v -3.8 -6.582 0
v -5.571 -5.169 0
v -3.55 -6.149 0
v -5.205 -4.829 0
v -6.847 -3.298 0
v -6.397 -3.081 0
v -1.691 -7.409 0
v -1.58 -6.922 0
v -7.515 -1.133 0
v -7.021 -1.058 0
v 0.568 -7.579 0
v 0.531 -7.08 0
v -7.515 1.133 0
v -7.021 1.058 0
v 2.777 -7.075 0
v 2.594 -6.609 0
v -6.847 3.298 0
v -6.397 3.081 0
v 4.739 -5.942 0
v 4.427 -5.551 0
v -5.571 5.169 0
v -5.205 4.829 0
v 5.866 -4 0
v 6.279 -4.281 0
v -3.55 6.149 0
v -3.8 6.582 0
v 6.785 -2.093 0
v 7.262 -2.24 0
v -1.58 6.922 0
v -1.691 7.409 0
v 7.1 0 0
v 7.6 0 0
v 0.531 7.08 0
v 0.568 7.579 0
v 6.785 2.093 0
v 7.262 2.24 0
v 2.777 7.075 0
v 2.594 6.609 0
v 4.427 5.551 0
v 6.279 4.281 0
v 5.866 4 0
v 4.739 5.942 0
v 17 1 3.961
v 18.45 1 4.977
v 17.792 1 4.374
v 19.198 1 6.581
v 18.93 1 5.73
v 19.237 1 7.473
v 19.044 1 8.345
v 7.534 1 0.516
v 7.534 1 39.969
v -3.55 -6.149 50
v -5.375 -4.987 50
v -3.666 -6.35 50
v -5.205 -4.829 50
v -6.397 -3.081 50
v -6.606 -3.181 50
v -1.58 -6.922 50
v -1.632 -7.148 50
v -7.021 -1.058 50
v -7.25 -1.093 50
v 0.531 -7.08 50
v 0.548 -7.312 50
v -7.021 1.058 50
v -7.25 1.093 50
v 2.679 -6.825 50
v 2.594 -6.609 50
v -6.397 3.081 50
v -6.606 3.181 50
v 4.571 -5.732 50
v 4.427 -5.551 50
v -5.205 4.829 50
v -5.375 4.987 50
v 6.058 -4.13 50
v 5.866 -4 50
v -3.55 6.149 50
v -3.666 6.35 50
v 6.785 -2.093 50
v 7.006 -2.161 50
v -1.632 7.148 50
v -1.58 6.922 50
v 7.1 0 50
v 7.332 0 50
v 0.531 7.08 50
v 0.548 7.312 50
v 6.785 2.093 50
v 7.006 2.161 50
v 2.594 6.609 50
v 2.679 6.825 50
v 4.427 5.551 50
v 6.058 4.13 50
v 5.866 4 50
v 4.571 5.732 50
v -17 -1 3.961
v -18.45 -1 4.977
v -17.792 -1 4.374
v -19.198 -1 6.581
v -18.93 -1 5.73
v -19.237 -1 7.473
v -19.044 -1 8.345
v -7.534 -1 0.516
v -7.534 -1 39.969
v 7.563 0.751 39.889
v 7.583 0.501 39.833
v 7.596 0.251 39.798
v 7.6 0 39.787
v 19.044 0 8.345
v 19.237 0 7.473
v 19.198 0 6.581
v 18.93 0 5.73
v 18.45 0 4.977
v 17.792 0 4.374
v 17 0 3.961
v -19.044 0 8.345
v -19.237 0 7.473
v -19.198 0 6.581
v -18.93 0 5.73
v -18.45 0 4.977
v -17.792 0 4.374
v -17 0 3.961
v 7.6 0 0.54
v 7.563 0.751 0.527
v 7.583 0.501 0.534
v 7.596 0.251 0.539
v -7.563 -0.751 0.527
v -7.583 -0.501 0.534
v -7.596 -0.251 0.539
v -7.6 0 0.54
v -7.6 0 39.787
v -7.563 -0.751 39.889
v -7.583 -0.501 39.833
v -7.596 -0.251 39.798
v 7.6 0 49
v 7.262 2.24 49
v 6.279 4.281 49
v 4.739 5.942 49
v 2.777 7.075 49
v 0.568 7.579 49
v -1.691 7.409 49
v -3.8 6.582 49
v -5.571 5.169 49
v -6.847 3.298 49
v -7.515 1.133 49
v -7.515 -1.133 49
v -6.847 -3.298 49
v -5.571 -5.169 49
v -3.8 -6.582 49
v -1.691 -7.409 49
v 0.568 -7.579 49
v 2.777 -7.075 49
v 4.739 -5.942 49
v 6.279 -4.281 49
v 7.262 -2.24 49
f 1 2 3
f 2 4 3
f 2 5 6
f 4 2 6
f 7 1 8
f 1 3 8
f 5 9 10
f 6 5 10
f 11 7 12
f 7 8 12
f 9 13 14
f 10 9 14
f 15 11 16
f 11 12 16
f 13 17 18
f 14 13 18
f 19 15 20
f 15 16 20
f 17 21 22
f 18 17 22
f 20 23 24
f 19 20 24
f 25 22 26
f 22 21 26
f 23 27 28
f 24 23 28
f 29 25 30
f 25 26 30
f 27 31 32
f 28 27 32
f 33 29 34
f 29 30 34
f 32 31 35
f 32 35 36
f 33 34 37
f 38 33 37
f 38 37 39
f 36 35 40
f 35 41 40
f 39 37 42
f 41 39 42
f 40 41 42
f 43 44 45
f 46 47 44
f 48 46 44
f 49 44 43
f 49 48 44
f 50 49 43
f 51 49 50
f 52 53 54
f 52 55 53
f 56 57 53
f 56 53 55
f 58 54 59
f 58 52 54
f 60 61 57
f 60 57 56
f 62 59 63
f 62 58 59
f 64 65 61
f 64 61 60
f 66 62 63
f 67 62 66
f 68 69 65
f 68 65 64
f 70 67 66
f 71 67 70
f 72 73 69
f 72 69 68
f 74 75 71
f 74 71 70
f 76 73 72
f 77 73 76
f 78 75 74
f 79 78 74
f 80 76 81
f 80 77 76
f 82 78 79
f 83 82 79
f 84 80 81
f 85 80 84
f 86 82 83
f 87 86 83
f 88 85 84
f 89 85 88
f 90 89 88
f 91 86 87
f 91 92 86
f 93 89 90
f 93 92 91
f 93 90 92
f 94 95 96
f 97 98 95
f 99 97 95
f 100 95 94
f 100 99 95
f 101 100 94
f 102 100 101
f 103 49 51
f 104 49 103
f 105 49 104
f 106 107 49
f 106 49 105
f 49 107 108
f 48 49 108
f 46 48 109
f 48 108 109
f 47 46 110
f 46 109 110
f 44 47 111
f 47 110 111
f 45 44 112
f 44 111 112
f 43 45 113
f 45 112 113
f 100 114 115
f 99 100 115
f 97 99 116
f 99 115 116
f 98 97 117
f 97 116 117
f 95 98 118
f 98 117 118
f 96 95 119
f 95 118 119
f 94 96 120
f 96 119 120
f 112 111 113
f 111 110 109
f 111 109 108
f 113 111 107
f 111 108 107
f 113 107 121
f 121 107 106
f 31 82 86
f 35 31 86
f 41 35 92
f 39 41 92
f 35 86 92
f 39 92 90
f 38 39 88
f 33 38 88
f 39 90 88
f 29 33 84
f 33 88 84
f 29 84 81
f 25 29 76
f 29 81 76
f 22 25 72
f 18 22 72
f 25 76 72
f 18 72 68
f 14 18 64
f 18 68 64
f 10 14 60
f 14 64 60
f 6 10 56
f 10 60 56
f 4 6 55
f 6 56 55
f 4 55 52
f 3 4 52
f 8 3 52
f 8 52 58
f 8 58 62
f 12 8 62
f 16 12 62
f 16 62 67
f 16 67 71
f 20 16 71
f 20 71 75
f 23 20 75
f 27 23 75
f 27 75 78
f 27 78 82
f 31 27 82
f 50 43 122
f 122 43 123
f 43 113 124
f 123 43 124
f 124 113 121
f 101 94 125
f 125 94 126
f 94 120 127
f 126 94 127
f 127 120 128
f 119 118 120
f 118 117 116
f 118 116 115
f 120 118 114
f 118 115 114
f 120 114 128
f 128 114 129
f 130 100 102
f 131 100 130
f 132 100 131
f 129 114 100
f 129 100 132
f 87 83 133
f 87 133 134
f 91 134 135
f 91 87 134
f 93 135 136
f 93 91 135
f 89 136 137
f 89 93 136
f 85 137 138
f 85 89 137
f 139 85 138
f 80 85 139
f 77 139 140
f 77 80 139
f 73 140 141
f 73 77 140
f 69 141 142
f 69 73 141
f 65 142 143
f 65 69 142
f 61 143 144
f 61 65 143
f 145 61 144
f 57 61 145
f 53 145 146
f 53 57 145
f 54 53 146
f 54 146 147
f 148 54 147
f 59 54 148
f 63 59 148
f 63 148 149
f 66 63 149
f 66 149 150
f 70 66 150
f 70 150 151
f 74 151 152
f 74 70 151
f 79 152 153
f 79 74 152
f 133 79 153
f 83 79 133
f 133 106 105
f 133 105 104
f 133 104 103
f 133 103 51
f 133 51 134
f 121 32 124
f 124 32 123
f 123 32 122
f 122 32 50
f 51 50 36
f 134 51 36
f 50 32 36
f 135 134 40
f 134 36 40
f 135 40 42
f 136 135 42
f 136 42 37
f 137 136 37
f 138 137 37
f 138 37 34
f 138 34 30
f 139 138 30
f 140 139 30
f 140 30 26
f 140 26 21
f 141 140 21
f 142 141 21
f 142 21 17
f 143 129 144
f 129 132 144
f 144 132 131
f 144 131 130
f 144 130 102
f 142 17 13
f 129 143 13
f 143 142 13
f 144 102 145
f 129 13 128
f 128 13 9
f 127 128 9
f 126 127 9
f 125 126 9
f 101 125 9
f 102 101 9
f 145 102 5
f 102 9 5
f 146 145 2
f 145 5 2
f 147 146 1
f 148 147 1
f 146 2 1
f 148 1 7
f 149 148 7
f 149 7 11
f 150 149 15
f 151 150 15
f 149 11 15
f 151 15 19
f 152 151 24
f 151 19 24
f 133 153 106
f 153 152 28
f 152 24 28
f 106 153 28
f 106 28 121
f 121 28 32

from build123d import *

# Parameters (mm, degrees)
SKETCH_R           = 7.6
PAD_DEPTH          = 50
PAD001_DEPTH       = 1
POLARPATTERN_COUNT = 2
CHAMFER_ANGLE      = 15
CHAMFER_SIZE       = 1
SKETCH002_R        = 7.1
POCKET_DEPTH       = 50.001


with BuildPart() as part:
    # Sketch → Pad (new body)
    with BuildSketch(Plane.XY):
        Circle(SKETCH_R)
    extrude(amount=PAD_DEPTH)

    # Sketch001 (on DatumPlane) → Pad001 (join)
    with BuildSketch(Plane(origin=(7.5, 0, 0), x_dir=(-1, 0, 0), z_dir=(0, 1, 0))):
        with BuildLine():
            Line((0.5, 0.321717), (0.5, 41.435605))
            Line((-11.54404, 8.344877), (0.5, 41.435605))
            ThreePointArc((-11.54404, 8.344877), (-11.429864, 5.729814), (-9.5, 3.961419))
            Line((-9.5, 3.961419), (0.5, 0.321717))
        make_face()
    pad001 = extrude(amount=PAD001_DEPTH)

    # PolarPattern: Pad001 ×2 about axis
    polarpattern_axis = Axis((0, 0, 0), (0, 0, 1))
    for i in range(1, POLARPATTERN_COUNT):
        add(pad001.rotate(polarpattern_axis, i * 360 / POLARPATTERN_COUNT))

    # Chamfer
    chamfer_edges = [part.edges().sort_by_distance(p)[0] for p in [
        (-7.6, 0, 50),
    ]]
    chamfer_side = part.faces().sort_by_distance((-7.6, 0, 49.45575))[0]
    chamfer(chamfer_edges, length=CHAMFER_SIZE, angle=CHAMFER_ANGLE, reference=chamfer_side)

    # Sketch002 (on Face12 of Chamfer) → Pocket (cut, through all)
    with BuildSketch(Plane.XY.offset(50)):
        Circle(SKETCH002_R)
    extrude(amount=-POCKET_DEPTH, mode=Mode.SUBTRACT)


solid = part.part
